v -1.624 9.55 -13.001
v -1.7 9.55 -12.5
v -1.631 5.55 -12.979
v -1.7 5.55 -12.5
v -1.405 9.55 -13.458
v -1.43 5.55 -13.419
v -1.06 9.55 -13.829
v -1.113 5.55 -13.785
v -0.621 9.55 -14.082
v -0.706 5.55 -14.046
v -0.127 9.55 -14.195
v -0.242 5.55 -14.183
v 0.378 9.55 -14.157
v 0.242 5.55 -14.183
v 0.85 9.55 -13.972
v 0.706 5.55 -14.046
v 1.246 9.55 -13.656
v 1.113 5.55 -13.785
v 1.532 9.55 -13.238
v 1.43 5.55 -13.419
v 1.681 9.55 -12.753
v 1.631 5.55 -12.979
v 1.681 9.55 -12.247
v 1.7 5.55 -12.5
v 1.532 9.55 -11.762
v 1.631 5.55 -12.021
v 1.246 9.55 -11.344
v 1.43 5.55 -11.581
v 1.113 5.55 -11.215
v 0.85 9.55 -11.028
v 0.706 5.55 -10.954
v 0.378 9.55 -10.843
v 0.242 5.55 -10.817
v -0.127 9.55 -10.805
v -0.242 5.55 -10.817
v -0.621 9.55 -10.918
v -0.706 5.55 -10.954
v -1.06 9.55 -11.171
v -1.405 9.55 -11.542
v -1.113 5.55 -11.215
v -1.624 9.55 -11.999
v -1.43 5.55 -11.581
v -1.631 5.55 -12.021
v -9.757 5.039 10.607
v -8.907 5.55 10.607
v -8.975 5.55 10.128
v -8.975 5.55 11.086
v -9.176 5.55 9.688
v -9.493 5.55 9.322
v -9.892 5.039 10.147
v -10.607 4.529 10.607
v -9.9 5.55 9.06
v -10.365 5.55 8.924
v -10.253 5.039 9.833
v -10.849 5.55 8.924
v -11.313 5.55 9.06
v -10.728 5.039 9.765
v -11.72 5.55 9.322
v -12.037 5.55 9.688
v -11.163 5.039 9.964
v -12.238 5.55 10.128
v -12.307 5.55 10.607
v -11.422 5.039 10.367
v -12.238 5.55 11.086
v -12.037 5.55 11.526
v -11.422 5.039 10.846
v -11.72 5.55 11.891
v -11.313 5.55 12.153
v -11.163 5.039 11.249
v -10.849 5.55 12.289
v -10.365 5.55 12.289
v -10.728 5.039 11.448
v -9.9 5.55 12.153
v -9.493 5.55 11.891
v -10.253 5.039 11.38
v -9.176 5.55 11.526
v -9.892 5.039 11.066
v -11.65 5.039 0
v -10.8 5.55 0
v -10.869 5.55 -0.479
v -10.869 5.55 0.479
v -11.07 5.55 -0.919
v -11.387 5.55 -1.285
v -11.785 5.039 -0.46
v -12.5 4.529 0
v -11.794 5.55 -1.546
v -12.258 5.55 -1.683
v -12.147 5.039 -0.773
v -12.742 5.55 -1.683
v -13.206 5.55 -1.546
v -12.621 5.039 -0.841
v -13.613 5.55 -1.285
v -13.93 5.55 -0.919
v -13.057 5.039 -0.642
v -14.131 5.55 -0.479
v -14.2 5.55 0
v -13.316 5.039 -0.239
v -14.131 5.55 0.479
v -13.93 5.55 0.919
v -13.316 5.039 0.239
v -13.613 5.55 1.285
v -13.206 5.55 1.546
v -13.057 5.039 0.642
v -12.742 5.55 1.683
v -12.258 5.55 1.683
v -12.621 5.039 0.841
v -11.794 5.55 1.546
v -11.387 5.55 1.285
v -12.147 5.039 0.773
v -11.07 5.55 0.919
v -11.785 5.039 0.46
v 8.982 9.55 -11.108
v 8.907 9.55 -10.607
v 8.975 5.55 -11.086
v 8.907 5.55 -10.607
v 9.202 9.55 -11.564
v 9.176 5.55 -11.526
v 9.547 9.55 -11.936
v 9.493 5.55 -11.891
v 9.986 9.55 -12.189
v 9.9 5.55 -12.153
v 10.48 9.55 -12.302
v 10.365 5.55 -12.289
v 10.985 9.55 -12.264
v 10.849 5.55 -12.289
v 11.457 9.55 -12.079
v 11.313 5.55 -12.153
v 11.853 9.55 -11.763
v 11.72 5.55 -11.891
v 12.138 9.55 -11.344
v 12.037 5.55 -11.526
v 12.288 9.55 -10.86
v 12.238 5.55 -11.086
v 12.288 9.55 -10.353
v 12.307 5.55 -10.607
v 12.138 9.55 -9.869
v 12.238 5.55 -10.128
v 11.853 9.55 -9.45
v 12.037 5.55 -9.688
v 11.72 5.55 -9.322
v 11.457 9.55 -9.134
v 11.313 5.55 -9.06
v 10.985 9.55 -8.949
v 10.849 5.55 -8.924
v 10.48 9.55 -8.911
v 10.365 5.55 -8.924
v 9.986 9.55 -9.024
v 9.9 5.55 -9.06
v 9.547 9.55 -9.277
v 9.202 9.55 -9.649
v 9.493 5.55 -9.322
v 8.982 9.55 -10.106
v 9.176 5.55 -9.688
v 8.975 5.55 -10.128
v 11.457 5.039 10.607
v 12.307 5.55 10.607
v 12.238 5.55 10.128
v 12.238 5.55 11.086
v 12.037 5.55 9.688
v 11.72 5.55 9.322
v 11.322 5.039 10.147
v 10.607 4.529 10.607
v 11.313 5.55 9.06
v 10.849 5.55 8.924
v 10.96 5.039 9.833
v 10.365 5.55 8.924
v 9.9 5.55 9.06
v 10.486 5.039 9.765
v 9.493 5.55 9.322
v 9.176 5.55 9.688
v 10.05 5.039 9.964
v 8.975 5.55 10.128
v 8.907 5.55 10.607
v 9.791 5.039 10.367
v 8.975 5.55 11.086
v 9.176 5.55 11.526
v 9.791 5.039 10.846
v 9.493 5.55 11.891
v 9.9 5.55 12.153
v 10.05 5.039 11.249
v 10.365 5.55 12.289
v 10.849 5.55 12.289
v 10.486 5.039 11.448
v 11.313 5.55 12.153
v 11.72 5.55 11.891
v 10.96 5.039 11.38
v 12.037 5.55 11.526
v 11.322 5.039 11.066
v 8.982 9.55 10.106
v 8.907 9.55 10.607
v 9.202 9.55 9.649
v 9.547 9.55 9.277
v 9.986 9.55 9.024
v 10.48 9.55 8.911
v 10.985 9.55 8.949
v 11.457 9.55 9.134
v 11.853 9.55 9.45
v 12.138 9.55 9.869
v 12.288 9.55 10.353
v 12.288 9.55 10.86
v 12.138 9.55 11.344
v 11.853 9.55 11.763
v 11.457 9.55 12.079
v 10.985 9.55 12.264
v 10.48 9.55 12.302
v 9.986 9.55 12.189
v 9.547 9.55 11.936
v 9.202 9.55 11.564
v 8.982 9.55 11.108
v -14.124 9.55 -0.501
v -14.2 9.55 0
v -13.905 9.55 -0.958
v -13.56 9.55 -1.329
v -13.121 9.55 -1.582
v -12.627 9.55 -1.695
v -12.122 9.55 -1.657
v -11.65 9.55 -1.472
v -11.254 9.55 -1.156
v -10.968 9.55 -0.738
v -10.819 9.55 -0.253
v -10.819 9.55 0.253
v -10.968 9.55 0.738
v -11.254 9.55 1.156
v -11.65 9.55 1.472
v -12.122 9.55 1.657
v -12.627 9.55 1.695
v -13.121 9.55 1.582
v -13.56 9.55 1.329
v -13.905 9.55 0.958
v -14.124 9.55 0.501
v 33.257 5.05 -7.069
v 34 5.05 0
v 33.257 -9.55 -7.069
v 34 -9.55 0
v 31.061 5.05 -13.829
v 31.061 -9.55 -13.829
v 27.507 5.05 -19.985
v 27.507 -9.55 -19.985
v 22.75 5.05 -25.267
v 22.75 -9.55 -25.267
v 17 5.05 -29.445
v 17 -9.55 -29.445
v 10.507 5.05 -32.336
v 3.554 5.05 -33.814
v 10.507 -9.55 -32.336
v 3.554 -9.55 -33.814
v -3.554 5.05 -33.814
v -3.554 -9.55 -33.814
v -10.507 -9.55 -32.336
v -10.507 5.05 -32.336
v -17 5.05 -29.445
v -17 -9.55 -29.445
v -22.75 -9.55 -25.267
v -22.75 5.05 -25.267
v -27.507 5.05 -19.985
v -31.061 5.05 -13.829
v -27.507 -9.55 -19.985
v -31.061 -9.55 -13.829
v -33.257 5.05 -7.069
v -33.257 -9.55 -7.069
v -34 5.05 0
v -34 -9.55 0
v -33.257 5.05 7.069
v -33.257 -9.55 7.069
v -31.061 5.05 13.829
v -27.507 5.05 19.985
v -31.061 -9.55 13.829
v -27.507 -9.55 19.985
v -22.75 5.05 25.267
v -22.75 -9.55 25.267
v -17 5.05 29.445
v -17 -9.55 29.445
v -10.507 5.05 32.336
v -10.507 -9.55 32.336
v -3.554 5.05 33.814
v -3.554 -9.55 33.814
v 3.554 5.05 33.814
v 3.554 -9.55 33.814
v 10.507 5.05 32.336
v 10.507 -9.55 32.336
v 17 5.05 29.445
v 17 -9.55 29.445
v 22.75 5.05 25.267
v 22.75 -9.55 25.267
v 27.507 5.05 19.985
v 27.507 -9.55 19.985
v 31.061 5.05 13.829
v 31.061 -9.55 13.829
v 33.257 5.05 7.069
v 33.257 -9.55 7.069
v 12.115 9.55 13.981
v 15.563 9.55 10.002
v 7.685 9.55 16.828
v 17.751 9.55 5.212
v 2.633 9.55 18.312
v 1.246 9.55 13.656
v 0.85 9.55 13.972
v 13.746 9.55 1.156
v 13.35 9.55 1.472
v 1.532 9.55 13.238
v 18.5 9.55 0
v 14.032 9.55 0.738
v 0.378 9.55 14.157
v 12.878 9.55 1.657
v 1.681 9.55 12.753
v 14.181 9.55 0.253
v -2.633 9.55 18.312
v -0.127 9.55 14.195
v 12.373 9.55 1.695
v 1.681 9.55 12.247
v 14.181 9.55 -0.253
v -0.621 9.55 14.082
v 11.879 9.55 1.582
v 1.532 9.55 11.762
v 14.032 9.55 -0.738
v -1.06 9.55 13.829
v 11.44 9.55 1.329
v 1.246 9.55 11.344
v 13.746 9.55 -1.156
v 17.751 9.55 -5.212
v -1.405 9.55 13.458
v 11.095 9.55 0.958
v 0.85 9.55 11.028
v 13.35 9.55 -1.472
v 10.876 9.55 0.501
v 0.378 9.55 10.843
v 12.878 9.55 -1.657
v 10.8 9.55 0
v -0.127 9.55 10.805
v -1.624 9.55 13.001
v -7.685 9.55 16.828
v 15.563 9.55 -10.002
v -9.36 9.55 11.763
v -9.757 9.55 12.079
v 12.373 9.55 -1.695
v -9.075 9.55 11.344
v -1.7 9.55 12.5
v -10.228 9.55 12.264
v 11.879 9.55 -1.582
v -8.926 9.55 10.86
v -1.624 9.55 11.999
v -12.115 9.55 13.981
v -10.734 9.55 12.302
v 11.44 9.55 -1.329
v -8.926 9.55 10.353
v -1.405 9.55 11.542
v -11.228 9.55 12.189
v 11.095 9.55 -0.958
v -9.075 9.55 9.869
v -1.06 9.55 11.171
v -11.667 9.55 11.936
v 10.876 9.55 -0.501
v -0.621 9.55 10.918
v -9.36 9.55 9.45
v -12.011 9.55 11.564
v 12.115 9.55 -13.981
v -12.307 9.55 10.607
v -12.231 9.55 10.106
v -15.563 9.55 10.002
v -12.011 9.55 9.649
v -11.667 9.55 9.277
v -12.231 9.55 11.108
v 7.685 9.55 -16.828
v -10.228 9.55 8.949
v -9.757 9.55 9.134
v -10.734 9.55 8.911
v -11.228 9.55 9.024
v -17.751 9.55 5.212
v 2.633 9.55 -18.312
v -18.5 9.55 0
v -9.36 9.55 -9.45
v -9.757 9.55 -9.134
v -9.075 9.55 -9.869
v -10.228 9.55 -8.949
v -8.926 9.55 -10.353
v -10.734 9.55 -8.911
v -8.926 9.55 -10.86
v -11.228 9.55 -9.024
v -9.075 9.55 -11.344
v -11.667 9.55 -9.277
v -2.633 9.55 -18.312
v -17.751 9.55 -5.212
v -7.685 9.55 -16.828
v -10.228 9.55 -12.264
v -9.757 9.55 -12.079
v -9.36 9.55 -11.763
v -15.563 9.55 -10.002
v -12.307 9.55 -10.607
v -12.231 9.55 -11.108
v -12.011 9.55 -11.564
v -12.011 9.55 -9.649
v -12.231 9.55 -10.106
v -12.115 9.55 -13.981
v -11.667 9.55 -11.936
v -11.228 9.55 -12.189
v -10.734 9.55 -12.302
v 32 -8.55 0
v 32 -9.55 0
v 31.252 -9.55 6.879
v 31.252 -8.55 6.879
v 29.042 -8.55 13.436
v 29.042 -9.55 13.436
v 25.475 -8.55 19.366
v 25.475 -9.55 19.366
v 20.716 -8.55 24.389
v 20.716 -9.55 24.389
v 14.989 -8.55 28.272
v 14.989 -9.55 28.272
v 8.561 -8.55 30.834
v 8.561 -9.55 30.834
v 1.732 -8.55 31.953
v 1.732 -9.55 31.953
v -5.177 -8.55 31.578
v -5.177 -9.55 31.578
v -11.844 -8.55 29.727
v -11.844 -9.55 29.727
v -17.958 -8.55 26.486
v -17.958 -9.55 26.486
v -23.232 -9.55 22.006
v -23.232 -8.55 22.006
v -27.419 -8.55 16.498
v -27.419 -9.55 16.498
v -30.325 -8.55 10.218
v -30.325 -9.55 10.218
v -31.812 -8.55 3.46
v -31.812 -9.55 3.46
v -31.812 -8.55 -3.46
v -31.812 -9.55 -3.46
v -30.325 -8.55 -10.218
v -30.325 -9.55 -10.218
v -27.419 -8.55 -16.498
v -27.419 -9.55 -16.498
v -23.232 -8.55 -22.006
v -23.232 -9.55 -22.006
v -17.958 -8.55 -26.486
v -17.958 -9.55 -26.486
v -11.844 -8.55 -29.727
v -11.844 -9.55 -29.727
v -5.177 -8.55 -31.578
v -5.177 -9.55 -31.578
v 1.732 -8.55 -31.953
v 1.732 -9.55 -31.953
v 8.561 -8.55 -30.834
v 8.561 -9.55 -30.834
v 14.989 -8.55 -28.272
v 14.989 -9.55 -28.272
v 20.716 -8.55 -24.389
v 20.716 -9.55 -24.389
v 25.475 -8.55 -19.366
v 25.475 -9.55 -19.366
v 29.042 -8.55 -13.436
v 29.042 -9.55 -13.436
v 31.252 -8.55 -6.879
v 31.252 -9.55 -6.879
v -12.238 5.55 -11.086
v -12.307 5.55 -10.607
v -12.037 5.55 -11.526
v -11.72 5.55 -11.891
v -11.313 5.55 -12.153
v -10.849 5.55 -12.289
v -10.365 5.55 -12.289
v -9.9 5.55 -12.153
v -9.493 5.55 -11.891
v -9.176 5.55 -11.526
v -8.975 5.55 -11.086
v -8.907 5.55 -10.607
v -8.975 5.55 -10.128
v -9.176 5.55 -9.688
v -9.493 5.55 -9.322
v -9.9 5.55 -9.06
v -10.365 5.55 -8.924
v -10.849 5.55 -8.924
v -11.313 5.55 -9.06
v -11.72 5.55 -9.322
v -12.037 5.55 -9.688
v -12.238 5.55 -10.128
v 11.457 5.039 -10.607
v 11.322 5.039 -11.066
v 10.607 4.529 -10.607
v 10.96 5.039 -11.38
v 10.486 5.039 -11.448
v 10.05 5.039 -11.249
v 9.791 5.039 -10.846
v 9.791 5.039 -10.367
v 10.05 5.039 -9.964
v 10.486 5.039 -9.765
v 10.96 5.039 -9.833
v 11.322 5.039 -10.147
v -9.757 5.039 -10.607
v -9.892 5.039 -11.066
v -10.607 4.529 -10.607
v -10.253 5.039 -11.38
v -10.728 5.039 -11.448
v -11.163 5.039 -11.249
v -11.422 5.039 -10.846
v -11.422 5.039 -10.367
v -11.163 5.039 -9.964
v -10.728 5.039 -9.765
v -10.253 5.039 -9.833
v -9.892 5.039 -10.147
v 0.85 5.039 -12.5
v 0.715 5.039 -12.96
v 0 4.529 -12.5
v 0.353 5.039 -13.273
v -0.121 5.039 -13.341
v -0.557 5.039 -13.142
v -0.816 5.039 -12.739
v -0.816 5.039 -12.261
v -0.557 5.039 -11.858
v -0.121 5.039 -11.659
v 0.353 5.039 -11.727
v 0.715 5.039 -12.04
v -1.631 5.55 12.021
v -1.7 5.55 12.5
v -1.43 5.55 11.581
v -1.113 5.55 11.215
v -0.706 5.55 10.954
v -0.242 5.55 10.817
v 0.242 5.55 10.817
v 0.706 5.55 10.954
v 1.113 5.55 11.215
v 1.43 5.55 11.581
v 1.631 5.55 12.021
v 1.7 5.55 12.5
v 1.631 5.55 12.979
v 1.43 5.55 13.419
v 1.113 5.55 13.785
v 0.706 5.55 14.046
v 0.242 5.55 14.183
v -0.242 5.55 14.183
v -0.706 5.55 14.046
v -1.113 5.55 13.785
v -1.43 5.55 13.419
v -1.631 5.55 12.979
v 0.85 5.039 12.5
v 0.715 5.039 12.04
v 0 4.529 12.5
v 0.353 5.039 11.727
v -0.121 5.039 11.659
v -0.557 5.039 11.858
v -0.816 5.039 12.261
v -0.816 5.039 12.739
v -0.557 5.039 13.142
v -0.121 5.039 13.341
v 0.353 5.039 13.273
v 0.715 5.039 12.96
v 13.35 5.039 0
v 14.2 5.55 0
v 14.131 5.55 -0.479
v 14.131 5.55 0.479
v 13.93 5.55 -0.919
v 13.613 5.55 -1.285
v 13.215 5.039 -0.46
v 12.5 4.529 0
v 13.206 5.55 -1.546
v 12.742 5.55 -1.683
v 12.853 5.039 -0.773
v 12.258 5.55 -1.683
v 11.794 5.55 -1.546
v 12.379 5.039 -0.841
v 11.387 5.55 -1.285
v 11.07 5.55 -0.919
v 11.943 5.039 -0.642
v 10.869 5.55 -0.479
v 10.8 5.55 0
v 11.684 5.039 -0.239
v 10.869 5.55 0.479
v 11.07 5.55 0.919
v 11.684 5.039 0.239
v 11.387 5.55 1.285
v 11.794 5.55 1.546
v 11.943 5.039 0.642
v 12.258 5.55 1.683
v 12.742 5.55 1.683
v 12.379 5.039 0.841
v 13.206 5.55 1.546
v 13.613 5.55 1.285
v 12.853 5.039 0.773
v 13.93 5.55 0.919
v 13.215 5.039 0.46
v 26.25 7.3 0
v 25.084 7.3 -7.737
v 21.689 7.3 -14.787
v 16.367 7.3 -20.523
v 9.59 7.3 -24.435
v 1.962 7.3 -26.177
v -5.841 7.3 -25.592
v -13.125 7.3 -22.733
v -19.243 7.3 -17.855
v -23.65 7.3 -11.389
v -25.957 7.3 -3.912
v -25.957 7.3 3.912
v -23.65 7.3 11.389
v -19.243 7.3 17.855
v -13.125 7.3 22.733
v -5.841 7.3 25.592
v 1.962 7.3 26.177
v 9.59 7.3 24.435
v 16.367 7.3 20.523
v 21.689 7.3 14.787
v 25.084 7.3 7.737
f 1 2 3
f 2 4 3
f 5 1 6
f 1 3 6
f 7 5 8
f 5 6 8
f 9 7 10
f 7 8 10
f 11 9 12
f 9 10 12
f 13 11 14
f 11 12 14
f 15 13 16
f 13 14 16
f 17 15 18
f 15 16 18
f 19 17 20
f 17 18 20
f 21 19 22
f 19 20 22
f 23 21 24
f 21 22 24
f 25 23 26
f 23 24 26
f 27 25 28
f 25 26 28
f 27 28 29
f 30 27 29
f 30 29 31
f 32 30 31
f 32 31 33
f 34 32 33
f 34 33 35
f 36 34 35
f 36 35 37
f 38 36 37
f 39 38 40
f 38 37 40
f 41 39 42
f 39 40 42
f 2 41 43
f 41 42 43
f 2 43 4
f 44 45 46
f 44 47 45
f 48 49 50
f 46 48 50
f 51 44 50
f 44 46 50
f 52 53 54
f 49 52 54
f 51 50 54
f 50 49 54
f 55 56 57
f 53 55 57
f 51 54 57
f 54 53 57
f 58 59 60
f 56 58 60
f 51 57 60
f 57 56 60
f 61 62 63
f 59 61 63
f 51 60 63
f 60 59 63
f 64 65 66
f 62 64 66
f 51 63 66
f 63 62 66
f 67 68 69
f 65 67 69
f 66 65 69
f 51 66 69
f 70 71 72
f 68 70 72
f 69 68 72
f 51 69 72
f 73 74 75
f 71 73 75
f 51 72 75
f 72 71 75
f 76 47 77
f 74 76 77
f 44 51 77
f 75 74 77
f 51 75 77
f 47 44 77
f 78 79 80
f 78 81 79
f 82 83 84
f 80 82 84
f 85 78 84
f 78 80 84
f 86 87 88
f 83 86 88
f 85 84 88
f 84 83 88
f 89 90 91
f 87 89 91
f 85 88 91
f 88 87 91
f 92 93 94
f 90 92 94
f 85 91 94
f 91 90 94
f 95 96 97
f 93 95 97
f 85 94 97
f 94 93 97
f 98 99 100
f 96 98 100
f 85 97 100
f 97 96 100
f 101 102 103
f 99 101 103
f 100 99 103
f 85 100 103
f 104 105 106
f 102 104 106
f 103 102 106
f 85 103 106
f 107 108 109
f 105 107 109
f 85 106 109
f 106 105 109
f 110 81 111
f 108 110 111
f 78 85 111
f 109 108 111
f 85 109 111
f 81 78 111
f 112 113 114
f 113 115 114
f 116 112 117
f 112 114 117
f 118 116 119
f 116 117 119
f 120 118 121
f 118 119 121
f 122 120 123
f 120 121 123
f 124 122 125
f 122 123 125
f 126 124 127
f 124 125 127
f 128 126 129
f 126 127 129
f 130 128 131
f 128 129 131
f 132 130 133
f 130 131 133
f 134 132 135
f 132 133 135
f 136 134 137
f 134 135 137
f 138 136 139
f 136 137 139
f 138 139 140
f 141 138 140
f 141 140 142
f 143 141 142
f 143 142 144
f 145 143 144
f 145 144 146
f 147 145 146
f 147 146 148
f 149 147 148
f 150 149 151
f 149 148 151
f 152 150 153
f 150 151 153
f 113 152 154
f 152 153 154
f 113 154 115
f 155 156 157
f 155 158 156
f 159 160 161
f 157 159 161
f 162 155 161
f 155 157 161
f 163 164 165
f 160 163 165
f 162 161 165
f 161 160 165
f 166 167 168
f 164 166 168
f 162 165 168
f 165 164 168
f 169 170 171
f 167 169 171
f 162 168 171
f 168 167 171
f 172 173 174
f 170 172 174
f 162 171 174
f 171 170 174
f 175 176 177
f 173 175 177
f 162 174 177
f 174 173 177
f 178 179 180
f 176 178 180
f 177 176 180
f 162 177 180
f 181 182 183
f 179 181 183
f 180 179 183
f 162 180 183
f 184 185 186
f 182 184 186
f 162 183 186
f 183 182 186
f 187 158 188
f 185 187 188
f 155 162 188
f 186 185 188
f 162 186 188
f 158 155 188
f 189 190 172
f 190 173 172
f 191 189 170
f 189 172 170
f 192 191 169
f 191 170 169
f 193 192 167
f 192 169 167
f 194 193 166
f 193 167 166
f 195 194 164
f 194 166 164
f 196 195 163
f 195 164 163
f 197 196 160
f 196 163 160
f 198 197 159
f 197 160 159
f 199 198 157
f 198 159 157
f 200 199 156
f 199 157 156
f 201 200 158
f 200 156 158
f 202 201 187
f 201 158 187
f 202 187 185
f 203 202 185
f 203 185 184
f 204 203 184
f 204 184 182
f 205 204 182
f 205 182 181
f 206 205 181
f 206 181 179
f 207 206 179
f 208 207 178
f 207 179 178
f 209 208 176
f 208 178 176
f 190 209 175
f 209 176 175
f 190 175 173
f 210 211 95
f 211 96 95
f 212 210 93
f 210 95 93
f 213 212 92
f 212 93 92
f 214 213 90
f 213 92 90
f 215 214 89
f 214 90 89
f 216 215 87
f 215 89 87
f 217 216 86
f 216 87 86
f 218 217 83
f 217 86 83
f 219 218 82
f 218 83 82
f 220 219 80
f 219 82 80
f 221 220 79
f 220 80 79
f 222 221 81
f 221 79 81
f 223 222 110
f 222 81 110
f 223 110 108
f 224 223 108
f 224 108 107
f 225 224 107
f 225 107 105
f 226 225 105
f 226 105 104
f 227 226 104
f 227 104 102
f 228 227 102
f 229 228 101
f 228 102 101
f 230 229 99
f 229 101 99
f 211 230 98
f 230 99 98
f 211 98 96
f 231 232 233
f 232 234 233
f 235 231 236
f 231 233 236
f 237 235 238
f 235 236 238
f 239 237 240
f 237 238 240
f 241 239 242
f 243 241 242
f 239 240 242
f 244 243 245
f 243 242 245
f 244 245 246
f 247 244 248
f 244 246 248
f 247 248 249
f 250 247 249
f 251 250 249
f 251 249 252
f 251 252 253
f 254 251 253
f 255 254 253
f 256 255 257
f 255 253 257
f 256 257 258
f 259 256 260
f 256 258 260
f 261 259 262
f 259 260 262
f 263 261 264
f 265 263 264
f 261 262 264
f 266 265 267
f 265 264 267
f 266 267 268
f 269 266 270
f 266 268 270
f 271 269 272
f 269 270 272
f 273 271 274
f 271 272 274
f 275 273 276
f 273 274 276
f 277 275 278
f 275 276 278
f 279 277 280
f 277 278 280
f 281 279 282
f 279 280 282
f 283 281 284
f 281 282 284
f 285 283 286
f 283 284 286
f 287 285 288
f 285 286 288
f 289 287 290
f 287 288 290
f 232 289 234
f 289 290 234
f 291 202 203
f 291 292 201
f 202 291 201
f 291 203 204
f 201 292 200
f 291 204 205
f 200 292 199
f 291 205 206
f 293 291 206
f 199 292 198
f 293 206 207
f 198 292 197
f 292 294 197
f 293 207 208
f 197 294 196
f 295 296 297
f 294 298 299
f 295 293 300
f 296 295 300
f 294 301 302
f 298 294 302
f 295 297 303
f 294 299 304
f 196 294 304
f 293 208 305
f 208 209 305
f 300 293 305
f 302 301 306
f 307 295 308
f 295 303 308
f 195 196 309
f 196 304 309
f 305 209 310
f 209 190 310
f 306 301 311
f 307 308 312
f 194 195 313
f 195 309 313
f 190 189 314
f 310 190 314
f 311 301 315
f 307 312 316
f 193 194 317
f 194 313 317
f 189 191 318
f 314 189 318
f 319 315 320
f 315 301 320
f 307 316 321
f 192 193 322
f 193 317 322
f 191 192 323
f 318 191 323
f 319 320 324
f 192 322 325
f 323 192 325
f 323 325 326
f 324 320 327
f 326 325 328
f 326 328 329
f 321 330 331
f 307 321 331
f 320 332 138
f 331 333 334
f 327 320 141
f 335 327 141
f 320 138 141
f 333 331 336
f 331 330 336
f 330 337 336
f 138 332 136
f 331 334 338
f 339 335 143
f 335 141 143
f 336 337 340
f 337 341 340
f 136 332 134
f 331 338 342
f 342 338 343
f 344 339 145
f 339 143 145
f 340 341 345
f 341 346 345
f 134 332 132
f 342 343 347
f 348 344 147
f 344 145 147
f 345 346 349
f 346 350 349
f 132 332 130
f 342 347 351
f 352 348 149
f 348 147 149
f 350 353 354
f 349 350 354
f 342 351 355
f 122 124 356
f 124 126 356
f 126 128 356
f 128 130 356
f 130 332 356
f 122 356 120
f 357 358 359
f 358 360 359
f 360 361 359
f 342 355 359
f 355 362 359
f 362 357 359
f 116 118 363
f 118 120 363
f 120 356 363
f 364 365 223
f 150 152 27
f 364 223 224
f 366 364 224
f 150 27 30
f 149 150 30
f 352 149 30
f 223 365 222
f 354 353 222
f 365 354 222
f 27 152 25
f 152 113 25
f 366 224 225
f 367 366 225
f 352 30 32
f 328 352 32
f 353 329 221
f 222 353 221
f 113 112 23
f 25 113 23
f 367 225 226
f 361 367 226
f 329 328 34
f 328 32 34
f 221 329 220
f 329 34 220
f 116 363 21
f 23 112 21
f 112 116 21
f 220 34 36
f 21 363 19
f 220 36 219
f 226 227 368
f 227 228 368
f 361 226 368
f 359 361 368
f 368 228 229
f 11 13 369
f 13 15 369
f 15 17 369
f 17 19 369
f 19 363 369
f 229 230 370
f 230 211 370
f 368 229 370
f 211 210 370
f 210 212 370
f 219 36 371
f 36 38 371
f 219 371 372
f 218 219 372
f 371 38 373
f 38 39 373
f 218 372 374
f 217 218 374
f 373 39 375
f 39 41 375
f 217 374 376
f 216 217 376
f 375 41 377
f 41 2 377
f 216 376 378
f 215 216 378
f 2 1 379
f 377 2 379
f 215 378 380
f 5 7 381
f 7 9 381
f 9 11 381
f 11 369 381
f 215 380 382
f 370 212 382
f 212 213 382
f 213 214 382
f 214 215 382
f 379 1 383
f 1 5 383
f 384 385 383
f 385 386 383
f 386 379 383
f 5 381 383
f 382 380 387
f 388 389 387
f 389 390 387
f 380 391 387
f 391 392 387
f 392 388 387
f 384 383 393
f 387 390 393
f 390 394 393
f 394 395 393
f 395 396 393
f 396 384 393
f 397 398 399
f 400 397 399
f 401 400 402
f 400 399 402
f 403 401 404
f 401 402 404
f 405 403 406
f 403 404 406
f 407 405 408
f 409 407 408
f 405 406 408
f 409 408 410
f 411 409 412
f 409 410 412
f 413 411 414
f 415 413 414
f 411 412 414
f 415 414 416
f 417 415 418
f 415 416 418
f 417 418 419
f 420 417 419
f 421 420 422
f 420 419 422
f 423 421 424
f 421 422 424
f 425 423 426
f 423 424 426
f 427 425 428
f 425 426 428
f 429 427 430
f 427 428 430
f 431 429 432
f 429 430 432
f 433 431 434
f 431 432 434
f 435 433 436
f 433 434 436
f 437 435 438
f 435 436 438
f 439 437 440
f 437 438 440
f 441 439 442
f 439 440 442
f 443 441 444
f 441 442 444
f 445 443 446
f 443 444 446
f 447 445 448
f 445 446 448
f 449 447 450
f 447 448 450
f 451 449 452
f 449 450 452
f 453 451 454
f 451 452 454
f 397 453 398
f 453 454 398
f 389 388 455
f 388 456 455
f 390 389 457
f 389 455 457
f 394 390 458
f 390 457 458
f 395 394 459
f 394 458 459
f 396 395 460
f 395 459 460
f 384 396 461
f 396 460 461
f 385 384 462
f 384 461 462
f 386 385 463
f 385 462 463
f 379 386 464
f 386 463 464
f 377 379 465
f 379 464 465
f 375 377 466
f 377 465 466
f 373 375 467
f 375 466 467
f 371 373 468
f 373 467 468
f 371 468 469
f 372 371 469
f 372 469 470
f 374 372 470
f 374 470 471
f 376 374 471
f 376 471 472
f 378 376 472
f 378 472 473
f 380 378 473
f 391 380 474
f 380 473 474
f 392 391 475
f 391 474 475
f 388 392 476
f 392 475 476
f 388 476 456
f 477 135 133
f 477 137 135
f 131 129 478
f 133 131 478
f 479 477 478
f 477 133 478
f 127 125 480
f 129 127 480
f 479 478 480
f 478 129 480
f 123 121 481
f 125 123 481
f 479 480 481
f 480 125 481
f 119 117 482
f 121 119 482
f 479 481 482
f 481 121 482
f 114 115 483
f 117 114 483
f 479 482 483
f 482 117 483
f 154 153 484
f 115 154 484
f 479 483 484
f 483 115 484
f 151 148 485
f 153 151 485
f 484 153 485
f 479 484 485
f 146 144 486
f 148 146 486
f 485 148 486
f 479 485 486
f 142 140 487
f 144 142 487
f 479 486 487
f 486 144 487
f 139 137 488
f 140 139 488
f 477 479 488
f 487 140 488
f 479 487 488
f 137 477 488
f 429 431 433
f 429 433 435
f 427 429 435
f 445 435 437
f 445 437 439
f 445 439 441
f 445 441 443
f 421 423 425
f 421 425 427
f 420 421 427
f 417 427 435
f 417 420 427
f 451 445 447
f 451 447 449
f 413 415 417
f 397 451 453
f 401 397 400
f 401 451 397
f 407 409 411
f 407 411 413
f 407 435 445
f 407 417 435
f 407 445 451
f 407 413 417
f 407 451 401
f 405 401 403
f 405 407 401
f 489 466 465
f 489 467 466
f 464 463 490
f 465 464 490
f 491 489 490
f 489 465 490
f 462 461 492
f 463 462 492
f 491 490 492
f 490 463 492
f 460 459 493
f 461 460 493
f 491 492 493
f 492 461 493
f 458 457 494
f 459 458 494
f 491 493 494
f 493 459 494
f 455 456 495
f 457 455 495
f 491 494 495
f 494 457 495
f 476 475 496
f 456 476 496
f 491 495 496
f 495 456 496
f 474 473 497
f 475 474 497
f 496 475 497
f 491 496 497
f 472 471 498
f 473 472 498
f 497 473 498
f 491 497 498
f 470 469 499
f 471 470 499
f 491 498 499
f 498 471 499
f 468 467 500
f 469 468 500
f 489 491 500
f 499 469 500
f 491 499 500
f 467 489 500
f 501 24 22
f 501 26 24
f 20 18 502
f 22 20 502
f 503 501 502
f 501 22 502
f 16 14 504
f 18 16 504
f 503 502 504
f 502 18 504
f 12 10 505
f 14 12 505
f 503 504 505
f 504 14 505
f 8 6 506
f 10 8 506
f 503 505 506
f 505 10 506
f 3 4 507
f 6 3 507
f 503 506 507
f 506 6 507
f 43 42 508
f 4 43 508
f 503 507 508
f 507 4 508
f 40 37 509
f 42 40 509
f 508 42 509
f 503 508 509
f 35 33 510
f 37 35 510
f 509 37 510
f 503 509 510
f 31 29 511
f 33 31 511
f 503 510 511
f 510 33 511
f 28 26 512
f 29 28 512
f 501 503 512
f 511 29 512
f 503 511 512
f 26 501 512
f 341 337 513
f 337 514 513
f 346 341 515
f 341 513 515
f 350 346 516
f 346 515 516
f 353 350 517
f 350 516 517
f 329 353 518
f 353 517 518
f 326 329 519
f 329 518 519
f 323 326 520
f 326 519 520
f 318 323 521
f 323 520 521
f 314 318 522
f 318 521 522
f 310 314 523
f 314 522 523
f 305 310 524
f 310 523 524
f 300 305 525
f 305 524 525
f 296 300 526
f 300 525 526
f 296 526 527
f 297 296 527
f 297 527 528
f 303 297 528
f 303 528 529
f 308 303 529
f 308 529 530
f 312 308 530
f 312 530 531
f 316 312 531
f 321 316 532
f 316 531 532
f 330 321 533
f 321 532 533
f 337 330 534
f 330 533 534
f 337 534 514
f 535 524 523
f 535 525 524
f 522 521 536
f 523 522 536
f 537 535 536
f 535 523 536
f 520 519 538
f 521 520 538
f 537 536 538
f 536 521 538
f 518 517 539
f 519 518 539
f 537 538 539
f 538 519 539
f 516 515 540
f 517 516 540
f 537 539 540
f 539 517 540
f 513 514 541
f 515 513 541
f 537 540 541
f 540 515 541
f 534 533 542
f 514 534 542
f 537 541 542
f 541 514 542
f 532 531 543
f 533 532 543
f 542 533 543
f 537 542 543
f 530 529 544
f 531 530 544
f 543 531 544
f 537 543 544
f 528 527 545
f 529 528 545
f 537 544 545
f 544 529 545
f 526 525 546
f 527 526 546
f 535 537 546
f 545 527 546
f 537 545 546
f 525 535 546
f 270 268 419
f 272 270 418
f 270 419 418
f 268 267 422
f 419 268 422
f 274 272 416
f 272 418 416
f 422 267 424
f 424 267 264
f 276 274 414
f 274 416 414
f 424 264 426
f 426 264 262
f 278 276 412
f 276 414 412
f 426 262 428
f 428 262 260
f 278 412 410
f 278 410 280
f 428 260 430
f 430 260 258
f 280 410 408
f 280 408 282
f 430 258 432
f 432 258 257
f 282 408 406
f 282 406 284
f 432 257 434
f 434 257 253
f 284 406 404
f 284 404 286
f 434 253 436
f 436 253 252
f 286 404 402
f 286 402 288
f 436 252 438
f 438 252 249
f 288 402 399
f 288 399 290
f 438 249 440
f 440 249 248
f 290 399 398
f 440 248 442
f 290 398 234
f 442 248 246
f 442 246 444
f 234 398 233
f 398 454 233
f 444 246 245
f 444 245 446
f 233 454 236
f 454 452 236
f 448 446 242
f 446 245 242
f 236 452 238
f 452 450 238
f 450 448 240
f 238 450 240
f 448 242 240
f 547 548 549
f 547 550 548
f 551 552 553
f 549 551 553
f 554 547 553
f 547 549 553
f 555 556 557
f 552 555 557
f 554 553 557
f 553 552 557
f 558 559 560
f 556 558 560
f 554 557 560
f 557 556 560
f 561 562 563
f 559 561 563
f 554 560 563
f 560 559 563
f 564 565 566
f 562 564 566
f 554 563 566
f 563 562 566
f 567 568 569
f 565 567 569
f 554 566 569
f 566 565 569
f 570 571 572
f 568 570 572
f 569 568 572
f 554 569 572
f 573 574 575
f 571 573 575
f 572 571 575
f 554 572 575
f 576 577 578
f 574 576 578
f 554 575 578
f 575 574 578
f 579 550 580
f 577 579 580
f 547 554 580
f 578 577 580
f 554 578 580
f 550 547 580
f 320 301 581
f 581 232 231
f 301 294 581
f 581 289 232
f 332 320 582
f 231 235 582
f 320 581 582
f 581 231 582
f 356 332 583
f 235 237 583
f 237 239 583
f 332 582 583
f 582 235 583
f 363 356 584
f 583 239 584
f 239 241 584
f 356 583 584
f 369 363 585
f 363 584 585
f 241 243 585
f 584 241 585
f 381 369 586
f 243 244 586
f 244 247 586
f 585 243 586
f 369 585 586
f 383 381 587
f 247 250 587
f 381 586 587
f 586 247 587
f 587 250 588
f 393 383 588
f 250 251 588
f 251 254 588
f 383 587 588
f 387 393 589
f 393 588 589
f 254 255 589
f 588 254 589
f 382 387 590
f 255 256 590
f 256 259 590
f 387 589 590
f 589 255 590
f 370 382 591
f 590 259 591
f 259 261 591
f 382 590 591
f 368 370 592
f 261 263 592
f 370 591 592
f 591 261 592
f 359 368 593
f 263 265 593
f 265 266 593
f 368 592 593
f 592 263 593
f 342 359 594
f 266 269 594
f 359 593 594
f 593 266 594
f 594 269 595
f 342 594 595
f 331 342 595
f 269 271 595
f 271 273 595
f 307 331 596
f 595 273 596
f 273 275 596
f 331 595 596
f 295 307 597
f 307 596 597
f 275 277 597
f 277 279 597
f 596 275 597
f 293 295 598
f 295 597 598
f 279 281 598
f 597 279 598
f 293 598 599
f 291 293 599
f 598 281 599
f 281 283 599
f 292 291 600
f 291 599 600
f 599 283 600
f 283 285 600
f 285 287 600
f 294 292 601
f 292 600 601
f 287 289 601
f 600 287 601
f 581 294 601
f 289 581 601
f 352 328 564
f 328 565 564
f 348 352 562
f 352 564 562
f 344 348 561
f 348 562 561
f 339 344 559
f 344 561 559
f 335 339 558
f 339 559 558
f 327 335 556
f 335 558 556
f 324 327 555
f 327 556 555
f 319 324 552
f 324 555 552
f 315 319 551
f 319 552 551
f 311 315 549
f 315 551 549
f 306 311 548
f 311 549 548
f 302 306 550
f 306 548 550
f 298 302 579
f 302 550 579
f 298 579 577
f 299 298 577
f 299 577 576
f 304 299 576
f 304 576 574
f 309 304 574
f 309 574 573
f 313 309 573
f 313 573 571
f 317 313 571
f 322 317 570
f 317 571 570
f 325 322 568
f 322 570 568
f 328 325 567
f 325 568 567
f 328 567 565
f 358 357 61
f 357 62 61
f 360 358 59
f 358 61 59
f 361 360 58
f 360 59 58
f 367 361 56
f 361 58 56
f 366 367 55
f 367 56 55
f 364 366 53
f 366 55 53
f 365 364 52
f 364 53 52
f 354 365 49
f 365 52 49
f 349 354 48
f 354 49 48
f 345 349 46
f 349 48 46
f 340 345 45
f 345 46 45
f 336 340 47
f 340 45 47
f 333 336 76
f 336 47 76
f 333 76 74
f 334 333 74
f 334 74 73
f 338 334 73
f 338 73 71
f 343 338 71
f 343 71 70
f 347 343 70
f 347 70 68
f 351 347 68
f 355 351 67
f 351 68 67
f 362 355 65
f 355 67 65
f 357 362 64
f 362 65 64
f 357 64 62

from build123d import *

# Parameters (mm, degrees)
M3_CLEARANCE_HOLE1_D     = 3.4
M3_CLEARANCE_HOLE1_DEPTH = 4
M3_CLEARANCE_HOLE1_TIP   = 1.021463052
SKETCH5_R                = 32
CUT_EXTRUDE1_DEPTH       = 1


with BuildPart() as part:
    # Sketch1 → Revolve1 (revolve)
    with BuildSketch(Plane.XY, mode=Mode.PRIVATE) as revolve1_sk:
        Polygon((0, -9.55), (0, 9.55), (-18.5, 9.55), (-34, 5.05), (-34, -9.55), align=None)
    revolve(revolve1_sk.sketch.rotate(Axis((0, -9.55, 0), (0, 1, 0)), 180), axis=Axis((0, -9.55, 0), (0, 1, 0)))

    # M3 Clearance Hole1
    with Locations(Plane(origin=(0, 9.55, 0), x_dir=(1, 0, 0), z_dir=(0, 1, 0))):
        with Locations((-10.606601718, 10.606601718), (0, 12.5), (10.606601718, 10.606601718), (12.5, 0), (10.606601718, -10.606601718), (-10.606601718, -10.606601718), (-12.5, 0), (0, -12.5)):
            Hole(M3_CLEARANCE_HOLE1_D / 2, depth=M3_CLEARANCE_HOLE1_DEPTH)
            with Locations((0, 0, -(M3_CLEARANCE_HOLE1_DEPTH + M3_CLEARANCE_HOLE1_TIP / 2))):  # 118° drill point
                Cone(0, M3_CLEARANCE_HOLE1_D / 2, M3_CLEARANCE_HOLE1_TIP, mode=Mode.SUBTRACT)

    # Sketch5 → Cut-Extrude1 (cut)
    with BuildSketch(Plane.XZ.offset(9.55)):
        Circle(SKETCH5_R)
    extrude(amount=-CUT_EXTRUDE1_DEPTH, mode=Mode.SUBTRACT)


solid = part.part
